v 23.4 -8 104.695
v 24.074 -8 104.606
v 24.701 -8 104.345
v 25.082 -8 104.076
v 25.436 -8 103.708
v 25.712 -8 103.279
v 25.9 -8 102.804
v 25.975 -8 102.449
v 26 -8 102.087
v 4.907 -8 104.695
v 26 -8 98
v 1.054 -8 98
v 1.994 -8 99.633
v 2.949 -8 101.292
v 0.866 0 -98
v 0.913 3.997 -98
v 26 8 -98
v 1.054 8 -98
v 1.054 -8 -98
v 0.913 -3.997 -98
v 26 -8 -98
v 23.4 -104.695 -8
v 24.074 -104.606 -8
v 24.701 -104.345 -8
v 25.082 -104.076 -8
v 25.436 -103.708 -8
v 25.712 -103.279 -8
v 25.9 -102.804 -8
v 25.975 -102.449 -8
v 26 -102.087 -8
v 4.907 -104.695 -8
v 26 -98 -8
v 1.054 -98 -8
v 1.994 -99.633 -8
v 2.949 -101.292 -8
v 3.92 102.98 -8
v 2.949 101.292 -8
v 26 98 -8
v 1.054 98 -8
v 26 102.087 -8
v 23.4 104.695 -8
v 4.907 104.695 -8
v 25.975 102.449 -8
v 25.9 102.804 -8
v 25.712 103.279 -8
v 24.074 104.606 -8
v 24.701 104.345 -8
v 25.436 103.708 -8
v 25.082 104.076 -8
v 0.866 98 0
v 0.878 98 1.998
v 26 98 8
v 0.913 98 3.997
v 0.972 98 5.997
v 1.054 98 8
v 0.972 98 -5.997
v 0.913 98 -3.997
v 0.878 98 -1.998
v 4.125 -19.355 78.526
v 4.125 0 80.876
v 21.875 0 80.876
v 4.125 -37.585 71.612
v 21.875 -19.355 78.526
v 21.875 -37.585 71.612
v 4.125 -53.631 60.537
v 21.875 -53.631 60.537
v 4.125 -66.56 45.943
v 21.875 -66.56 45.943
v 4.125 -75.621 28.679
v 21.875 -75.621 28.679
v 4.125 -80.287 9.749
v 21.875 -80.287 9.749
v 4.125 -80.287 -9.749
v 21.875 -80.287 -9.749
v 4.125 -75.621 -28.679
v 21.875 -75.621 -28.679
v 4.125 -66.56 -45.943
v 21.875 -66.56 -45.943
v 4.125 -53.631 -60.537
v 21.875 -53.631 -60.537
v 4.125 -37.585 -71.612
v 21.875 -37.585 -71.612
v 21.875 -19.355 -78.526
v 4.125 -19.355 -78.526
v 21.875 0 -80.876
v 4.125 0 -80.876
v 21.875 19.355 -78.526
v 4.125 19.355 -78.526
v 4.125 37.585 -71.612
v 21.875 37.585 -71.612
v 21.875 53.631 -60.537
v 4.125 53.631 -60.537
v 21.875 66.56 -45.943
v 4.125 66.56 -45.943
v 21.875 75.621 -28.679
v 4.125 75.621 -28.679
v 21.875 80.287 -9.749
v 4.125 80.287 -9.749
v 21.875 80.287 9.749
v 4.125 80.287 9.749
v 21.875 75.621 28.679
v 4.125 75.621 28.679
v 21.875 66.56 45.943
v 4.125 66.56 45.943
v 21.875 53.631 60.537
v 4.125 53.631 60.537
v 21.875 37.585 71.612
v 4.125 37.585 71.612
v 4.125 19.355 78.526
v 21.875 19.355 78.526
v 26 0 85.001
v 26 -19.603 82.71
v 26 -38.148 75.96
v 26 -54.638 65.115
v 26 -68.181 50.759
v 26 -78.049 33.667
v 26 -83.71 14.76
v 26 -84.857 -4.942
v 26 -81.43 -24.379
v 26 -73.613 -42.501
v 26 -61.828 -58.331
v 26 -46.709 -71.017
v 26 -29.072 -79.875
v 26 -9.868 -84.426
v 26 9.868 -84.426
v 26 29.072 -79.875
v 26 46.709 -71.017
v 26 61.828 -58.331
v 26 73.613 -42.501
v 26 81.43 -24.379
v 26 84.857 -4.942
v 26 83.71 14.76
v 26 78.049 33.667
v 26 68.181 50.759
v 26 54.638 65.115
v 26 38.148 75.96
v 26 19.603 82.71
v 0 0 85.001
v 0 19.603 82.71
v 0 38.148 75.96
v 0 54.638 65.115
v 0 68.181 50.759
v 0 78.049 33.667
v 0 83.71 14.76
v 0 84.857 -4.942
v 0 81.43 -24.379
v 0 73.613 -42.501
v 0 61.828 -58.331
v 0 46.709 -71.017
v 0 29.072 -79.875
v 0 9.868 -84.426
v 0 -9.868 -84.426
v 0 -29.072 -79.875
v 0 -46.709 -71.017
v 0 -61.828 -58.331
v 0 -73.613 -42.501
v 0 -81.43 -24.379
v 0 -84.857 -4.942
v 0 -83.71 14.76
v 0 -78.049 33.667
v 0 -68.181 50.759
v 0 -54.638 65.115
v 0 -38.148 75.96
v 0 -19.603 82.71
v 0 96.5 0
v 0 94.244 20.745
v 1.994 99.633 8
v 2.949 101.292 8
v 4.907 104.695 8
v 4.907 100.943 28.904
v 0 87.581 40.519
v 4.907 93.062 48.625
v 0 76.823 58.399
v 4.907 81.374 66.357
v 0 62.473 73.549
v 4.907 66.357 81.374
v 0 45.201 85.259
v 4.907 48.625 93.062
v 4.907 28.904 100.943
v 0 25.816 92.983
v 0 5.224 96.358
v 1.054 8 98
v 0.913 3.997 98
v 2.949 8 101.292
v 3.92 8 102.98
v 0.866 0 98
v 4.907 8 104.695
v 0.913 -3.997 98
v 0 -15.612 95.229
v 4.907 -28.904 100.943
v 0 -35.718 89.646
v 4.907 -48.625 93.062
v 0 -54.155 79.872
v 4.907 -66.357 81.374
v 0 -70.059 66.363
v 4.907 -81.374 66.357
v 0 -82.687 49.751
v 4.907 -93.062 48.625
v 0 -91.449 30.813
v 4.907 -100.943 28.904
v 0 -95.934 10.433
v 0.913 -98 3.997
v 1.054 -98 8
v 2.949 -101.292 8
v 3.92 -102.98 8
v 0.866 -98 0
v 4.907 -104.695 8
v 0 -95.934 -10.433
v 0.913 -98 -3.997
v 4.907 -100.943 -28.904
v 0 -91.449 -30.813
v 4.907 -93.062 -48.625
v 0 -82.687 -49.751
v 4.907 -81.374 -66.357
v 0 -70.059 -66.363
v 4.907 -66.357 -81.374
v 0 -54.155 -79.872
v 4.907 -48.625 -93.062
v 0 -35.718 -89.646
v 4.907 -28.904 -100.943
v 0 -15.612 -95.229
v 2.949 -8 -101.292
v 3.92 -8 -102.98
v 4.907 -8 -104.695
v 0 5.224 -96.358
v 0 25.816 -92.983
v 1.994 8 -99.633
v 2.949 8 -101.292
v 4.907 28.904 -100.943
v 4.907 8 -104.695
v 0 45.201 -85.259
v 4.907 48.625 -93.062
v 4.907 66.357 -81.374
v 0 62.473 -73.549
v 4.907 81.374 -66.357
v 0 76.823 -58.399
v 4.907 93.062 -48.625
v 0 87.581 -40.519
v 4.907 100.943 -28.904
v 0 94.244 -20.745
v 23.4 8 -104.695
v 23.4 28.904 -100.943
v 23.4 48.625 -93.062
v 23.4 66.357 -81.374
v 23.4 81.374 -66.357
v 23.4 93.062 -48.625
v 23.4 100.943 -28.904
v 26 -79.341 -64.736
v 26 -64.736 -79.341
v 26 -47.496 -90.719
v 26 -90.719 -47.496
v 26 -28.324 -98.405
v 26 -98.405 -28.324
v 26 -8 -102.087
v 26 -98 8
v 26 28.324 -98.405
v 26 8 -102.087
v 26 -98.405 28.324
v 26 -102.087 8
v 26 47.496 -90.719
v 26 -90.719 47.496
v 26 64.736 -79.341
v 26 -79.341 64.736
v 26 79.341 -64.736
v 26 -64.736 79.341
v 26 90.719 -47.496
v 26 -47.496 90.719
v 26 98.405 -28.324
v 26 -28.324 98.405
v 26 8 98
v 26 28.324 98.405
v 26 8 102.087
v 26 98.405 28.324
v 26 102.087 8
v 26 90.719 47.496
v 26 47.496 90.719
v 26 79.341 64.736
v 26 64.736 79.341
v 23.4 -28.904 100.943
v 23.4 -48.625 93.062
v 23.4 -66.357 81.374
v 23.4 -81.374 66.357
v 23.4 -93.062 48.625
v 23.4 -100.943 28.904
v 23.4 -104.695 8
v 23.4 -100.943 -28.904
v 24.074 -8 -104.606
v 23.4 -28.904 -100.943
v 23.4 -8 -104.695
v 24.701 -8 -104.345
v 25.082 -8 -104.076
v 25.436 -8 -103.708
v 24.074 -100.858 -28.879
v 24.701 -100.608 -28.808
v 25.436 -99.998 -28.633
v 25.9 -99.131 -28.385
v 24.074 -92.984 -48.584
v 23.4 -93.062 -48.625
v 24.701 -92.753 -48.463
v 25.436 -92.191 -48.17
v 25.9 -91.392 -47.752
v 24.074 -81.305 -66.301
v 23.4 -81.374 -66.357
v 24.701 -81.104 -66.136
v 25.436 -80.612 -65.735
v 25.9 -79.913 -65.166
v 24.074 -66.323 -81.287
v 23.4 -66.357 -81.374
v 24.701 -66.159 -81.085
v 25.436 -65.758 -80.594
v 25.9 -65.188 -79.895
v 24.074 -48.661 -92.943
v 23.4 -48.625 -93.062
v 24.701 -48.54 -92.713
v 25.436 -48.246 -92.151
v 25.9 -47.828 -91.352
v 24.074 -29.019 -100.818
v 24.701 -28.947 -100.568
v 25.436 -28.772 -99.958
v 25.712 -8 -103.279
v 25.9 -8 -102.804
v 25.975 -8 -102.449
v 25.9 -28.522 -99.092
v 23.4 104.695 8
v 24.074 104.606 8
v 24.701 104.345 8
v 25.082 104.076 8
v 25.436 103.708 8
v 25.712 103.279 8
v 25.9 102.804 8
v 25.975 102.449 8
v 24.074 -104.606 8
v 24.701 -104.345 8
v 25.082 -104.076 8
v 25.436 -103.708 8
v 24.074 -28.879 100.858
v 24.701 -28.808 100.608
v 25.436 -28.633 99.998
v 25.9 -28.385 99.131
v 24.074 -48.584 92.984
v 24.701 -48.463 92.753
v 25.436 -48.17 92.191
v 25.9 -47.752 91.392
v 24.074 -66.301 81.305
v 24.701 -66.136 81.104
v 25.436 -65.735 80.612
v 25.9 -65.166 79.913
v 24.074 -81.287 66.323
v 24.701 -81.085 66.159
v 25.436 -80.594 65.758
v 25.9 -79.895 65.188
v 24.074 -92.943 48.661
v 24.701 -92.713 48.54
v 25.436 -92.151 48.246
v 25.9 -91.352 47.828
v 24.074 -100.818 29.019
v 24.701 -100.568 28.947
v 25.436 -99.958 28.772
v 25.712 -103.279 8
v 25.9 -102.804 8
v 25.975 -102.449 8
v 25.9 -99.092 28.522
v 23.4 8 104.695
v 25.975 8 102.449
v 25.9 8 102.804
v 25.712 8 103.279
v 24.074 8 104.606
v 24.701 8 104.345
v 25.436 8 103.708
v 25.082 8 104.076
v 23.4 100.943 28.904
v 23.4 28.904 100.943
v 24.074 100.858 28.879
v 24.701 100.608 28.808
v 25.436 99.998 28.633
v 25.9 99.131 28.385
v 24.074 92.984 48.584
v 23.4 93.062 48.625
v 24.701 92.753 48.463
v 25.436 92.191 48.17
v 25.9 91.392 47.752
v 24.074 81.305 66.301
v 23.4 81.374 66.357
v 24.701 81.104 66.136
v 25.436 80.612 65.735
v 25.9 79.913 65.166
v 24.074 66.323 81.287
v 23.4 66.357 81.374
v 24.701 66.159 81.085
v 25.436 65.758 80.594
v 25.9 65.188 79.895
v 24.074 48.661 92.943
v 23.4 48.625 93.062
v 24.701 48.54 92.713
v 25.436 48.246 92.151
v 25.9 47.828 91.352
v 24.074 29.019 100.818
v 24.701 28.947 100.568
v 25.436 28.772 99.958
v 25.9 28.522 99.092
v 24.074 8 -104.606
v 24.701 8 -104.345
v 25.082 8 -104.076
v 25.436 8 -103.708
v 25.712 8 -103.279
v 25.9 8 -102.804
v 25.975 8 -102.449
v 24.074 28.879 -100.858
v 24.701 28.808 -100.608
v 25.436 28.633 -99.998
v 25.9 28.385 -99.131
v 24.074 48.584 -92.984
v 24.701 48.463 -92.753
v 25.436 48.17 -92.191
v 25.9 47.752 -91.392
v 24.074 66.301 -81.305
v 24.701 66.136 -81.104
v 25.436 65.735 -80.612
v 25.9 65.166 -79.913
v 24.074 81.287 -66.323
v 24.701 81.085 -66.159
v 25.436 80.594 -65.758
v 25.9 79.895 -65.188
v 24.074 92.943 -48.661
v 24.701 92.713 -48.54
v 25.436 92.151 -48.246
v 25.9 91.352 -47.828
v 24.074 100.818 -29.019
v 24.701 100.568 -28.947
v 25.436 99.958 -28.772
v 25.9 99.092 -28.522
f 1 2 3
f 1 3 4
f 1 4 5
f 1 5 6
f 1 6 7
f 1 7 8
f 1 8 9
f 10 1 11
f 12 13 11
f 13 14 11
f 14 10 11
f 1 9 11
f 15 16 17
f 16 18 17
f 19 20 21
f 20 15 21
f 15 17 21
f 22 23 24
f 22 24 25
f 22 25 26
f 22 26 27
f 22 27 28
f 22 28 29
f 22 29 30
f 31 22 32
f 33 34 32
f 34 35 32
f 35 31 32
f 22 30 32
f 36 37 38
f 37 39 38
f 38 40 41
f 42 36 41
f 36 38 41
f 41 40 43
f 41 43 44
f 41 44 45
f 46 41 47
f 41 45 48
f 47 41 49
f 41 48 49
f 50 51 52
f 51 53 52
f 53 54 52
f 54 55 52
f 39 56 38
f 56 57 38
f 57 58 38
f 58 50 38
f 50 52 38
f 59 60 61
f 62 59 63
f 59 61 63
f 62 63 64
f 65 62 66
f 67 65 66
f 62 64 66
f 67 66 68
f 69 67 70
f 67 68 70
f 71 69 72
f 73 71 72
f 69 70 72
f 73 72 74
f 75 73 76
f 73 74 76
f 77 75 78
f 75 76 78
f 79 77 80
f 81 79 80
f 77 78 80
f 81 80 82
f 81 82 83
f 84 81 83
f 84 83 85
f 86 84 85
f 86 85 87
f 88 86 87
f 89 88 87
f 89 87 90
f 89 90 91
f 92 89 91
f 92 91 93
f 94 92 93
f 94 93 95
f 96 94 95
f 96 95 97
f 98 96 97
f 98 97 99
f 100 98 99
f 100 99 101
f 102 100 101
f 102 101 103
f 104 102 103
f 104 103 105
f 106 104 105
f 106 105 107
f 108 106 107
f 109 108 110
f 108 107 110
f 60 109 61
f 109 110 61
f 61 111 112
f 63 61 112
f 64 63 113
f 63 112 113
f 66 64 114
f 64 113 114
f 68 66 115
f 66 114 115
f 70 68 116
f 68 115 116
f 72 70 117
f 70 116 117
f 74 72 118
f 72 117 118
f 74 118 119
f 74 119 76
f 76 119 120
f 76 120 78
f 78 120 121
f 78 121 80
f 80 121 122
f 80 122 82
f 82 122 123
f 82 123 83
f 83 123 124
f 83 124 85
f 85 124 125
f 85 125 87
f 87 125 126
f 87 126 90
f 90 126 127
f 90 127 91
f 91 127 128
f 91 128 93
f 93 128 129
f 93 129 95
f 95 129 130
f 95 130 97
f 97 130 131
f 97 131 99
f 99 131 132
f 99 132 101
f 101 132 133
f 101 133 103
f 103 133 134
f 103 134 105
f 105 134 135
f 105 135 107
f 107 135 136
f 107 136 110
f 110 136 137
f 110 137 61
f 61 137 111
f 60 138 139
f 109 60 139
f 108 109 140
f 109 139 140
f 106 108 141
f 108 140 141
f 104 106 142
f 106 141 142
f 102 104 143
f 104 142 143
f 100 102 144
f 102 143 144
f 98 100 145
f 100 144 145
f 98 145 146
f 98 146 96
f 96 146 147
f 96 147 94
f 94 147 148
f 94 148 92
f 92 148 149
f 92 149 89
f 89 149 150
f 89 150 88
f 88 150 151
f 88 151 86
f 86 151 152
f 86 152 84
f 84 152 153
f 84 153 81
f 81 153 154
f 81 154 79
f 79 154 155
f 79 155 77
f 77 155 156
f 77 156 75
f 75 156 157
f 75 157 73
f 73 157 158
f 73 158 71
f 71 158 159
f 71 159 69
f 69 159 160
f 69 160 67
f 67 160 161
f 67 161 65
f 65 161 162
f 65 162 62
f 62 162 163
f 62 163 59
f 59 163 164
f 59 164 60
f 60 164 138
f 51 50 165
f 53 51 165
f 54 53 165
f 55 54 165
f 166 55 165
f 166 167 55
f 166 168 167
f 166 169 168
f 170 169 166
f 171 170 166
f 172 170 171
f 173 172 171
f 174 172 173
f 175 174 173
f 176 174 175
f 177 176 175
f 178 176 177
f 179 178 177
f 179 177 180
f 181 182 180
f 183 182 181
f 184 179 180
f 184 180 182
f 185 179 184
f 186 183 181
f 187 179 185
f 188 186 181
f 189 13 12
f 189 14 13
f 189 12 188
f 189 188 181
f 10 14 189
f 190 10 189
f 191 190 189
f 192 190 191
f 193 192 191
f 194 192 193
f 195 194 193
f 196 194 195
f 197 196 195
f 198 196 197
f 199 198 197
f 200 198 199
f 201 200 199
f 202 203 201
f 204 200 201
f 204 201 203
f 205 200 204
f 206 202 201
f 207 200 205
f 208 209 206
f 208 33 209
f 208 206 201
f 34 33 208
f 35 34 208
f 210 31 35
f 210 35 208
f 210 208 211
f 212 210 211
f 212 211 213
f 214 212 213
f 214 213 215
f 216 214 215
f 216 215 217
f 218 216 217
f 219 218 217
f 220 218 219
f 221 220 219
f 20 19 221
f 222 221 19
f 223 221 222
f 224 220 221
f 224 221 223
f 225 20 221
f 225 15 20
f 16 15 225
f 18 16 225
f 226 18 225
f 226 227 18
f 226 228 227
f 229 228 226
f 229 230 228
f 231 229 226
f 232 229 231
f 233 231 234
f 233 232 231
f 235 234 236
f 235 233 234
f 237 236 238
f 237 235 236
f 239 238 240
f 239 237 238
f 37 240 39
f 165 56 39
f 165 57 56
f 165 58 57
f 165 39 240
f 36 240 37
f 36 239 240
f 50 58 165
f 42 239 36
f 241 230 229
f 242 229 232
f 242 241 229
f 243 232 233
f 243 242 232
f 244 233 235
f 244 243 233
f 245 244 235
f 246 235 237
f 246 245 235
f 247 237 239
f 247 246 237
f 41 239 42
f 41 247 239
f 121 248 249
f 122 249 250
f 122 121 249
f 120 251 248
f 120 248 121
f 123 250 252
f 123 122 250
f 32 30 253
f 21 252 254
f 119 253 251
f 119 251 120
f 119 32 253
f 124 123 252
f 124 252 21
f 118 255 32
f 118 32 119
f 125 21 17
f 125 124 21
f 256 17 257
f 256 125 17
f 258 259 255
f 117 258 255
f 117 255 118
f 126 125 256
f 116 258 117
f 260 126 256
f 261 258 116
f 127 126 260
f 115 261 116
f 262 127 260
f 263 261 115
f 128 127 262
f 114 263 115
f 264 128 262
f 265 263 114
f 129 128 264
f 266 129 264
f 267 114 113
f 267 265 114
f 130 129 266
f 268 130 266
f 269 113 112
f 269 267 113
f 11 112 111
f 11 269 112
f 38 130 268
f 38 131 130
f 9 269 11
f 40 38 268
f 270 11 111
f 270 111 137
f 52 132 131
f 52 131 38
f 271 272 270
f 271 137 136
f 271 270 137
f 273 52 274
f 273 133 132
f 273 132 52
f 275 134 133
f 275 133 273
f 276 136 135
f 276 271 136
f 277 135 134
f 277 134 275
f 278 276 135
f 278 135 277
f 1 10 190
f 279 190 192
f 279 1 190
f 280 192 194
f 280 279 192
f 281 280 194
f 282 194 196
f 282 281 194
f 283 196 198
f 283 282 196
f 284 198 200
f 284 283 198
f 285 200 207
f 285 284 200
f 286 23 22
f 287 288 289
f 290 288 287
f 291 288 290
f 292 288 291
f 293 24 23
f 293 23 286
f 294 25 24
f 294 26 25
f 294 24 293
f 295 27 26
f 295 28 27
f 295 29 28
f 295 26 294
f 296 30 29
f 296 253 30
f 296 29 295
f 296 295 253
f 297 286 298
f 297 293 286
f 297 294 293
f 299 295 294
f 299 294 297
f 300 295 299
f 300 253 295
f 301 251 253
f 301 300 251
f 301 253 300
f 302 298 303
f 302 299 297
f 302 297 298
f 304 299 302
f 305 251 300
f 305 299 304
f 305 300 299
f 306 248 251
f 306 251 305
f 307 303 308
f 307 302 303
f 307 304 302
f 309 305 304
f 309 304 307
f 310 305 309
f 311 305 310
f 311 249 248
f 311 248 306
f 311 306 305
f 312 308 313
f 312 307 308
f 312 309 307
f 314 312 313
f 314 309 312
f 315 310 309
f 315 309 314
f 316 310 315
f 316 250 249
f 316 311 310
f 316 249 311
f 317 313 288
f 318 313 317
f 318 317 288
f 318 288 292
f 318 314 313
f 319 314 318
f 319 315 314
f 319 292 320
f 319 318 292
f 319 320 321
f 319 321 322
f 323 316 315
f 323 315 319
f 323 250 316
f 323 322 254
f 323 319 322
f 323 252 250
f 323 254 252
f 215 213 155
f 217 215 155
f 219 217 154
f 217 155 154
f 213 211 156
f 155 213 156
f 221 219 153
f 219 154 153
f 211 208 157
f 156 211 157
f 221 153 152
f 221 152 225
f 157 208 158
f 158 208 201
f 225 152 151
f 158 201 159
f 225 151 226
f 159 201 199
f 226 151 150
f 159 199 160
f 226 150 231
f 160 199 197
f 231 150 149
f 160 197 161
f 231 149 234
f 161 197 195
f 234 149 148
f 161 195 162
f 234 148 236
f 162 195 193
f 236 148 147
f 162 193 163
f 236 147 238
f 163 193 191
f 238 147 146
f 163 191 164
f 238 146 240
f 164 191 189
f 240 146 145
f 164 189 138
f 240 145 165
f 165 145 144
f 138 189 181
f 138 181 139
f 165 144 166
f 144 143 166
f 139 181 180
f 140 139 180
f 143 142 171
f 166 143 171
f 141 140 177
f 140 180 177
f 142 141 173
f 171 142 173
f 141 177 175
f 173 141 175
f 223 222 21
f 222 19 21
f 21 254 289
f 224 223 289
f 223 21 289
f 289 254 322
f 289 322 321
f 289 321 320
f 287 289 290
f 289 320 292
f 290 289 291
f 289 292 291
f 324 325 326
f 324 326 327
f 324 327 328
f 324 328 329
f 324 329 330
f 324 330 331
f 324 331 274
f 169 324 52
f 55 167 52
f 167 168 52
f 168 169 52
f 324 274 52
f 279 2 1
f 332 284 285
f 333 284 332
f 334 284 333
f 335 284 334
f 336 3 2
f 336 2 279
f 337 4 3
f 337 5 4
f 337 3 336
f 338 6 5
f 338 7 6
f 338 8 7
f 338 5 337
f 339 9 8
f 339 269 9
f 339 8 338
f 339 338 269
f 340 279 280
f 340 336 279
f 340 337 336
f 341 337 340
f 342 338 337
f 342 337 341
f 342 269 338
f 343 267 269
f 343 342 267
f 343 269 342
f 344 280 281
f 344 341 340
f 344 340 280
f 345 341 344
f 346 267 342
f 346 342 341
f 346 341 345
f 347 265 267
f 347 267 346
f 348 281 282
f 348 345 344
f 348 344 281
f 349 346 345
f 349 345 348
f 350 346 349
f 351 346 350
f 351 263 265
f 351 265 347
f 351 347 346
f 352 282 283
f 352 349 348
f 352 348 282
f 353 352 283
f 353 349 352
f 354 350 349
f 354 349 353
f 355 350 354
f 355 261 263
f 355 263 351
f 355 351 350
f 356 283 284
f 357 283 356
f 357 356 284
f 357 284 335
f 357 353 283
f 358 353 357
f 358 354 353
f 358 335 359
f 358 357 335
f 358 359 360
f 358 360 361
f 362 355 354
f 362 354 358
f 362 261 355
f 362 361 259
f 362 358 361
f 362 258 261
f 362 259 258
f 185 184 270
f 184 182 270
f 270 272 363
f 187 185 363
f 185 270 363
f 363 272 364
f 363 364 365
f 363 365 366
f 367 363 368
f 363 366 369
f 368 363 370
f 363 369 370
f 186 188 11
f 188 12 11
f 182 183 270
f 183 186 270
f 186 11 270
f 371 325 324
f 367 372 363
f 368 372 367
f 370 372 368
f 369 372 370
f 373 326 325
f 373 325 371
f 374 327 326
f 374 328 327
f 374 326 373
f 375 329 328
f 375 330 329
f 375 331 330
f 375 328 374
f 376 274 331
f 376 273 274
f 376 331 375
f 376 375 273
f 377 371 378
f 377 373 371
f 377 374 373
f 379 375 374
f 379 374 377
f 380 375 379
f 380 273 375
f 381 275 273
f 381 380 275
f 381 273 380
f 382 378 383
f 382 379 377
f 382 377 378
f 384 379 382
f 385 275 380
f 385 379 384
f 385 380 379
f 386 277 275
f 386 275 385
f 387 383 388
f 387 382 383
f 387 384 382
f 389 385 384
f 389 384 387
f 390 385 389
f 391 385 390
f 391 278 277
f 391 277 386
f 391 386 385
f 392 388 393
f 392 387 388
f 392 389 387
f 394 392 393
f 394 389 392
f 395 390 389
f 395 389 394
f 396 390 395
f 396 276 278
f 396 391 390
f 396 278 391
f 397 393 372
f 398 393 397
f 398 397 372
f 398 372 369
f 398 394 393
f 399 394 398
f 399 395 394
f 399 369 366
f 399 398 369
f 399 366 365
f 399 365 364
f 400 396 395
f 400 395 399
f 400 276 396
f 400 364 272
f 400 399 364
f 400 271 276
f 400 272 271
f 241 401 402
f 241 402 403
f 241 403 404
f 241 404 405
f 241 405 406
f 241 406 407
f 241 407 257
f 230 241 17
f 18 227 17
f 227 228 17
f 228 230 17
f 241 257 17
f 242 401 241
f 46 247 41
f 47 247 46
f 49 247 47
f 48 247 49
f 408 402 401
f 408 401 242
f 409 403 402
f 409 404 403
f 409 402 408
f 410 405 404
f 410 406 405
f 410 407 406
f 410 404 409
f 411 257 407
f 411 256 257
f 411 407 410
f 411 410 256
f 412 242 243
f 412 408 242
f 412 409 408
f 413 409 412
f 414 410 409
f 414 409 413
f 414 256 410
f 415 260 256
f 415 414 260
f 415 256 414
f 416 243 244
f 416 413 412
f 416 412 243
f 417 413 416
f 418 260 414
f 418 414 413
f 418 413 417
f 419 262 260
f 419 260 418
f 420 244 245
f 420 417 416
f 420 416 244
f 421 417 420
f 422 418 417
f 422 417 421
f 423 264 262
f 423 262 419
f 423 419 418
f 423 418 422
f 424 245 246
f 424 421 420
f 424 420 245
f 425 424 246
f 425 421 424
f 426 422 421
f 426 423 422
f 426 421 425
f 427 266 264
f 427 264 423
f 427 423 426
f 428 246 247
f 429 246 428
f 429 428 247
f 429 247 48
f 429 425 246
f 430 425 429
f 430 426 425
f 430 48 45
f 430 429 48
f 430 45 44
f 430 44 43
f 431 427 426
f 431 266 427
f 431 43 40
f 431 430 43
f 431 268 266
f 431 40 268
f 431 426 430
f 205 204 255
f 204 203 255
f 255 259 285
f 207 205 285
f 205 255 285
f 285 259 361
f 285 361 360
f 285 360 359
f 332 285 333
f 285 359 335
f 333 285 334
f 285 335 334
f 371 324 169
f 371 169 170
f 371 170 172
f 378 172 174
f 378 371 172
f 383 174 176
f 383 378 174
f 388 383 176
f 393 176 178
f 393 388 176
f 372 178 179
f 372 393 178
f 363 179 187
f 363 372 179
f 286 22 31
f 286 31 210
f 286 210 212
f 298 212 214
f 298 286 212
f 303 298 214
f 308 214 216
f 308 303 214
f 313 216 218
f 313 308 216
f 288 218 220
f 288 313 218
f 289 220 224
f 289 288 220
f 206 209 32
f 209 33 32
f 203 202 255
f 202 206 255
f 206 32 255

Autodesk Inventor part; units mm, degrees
ref_plane "YZ Plane" through (0, 0, 0) normal (1, 0, 0) x (0, 1, 0)
ref_plane "XZ Plane" through (0, 0, 0) normal (0, 1, 0) x (-1, 0, 0)
sketch "Sketch1" plane through (0, 0, 0) normal (0, 0, 1) x (1, 0, 0)
  line L0 (0, 0) -> (26, 0)
  line L1 (0, 0) -> (0, 105)
  line L2 (0, 105) -> (26, 105)
  line L3 (26, 105) -> (26, 0)
  line L4 (0, 126) -> (0, -21) projected
  line L5 (-5.2, 0) -> (31.2, 0) projected
  dimension "d1" = 210
  dimension "d2" = 26
revolve "Body" add sketch "Sketch1" angle 360 about axis through (0, 0, 0) along (1, 0, 0)
sketch "Sketch2" plane through (0, 0, 0) normal (-1, 0, 0) x (0, 0, 1)
  circle A0 centre (0, 0) radius 105 projected
  point P0 (0, 0)
hole "Thread" at (0, 0, 0) direction (1, 0, 0) diameter 161.7524 end through all thread size "M165x3" class "6H" standard "ISO Metric profile"
chamfer "Chamfer1" distance 8.5 angle 30 1 edges at (0, -105, 0) measured on face at (0, 48.5251, -83.6903)
sketch "Sketch3" plane through (26, 0, 0) normal (1, 0, 0) x (0, 0, -1)
  circle A0 centre (0, 0) radius 105 projected
  line L0 (-8, 104.6948) -> (-8, 98)
  line L1 (-8, 98) -> (8, 98)
  line L2 (8, 98) -> (8, 104.6948)
  line L3 (0, -147) -> (0, 147) projected
  line L4 (-147, 0) -> (147, 0) projected
  dimension "d12" = 8
  dimension "d13" = 8
  dimension "d14" = 98
extrude "Groove1" cut sketch "Sketch3" against normal through all contours L2 L1 L3 A0 | L3 L1 L0 A0
pattern_circular "Grooves1" count 4 over 360 about axis through (-10, 0, 0) along (1, 0, 0) of "Groove1"
fillet "Fillet1" radius 2.6 4 edges at (26, 74.2462, 74.2462) (26, 74.2462, -74.2462) (26, -74.2462, -74.2462) (26, -74.2462, 74.2462)
chamfer "Chamfer2" distance 4.125 angle 45 1 edges at (26, 0, -80.8762) measured on face at (26, -86.7774, -38.7468)
chamfer "Chamfer3" distance 4.125 angle 45 1 edges at (0, 0, -80.8762) measured on face at (0, 90.9647, -4.5778)
ref_plane "Work Plane1" through (298.1208, 0, 0) normal (0, 1, 0) x (-1, 0, 0)
equation "\"d1\" = SD2"
equation "\"d2\" = KOH"
equation "\"d12\" = 0.5 * SNB"
equation "\"d13\" = 0.5 * SNB"
equation "\"d14\" = 0.5 * SD2 - SNT"
equation "\"d10\" = -0.5 * LADI + 0.5 * SD2"
equation "\"d11\" = FAWI2"
equation "\"d40\" = -0.5 * LADI + 0.5 * SD2"
equation "\"d18\" = RR"
equation "\"d19\" = 0.025 * NND"
equation "\"d41\" = 0.025 * NND"
equation "\"d21\" = 0.025 * NND"
equation "\"d42\" = 0.025 * NND"
equation "\"NND\" = 165"
equation "\"KOH\" = 26"
equation "\"SD2\" = 210"
equation "\"SNB\" = 16"
equation "\"SNT\" = 7"
equation "\"LADI\" = 193"
equation "\"RR\" = 2.6"
equation "\"FAWI2\" = 30deg"
equation "\"GUL\" = 0.61345 * PTC"
equation "\"THREADDIA\" = 165"
equation "\"TOA\" = 30deg"
equation "\"PTC\" = 3"
equation "\"GAL\" = 0.61345 * PTC"
equation "\"GD1\" = THREADDIA - 1.2269 * PTC"
properties part number "DIN 981 - KM 33" material "Steel, Mild"
